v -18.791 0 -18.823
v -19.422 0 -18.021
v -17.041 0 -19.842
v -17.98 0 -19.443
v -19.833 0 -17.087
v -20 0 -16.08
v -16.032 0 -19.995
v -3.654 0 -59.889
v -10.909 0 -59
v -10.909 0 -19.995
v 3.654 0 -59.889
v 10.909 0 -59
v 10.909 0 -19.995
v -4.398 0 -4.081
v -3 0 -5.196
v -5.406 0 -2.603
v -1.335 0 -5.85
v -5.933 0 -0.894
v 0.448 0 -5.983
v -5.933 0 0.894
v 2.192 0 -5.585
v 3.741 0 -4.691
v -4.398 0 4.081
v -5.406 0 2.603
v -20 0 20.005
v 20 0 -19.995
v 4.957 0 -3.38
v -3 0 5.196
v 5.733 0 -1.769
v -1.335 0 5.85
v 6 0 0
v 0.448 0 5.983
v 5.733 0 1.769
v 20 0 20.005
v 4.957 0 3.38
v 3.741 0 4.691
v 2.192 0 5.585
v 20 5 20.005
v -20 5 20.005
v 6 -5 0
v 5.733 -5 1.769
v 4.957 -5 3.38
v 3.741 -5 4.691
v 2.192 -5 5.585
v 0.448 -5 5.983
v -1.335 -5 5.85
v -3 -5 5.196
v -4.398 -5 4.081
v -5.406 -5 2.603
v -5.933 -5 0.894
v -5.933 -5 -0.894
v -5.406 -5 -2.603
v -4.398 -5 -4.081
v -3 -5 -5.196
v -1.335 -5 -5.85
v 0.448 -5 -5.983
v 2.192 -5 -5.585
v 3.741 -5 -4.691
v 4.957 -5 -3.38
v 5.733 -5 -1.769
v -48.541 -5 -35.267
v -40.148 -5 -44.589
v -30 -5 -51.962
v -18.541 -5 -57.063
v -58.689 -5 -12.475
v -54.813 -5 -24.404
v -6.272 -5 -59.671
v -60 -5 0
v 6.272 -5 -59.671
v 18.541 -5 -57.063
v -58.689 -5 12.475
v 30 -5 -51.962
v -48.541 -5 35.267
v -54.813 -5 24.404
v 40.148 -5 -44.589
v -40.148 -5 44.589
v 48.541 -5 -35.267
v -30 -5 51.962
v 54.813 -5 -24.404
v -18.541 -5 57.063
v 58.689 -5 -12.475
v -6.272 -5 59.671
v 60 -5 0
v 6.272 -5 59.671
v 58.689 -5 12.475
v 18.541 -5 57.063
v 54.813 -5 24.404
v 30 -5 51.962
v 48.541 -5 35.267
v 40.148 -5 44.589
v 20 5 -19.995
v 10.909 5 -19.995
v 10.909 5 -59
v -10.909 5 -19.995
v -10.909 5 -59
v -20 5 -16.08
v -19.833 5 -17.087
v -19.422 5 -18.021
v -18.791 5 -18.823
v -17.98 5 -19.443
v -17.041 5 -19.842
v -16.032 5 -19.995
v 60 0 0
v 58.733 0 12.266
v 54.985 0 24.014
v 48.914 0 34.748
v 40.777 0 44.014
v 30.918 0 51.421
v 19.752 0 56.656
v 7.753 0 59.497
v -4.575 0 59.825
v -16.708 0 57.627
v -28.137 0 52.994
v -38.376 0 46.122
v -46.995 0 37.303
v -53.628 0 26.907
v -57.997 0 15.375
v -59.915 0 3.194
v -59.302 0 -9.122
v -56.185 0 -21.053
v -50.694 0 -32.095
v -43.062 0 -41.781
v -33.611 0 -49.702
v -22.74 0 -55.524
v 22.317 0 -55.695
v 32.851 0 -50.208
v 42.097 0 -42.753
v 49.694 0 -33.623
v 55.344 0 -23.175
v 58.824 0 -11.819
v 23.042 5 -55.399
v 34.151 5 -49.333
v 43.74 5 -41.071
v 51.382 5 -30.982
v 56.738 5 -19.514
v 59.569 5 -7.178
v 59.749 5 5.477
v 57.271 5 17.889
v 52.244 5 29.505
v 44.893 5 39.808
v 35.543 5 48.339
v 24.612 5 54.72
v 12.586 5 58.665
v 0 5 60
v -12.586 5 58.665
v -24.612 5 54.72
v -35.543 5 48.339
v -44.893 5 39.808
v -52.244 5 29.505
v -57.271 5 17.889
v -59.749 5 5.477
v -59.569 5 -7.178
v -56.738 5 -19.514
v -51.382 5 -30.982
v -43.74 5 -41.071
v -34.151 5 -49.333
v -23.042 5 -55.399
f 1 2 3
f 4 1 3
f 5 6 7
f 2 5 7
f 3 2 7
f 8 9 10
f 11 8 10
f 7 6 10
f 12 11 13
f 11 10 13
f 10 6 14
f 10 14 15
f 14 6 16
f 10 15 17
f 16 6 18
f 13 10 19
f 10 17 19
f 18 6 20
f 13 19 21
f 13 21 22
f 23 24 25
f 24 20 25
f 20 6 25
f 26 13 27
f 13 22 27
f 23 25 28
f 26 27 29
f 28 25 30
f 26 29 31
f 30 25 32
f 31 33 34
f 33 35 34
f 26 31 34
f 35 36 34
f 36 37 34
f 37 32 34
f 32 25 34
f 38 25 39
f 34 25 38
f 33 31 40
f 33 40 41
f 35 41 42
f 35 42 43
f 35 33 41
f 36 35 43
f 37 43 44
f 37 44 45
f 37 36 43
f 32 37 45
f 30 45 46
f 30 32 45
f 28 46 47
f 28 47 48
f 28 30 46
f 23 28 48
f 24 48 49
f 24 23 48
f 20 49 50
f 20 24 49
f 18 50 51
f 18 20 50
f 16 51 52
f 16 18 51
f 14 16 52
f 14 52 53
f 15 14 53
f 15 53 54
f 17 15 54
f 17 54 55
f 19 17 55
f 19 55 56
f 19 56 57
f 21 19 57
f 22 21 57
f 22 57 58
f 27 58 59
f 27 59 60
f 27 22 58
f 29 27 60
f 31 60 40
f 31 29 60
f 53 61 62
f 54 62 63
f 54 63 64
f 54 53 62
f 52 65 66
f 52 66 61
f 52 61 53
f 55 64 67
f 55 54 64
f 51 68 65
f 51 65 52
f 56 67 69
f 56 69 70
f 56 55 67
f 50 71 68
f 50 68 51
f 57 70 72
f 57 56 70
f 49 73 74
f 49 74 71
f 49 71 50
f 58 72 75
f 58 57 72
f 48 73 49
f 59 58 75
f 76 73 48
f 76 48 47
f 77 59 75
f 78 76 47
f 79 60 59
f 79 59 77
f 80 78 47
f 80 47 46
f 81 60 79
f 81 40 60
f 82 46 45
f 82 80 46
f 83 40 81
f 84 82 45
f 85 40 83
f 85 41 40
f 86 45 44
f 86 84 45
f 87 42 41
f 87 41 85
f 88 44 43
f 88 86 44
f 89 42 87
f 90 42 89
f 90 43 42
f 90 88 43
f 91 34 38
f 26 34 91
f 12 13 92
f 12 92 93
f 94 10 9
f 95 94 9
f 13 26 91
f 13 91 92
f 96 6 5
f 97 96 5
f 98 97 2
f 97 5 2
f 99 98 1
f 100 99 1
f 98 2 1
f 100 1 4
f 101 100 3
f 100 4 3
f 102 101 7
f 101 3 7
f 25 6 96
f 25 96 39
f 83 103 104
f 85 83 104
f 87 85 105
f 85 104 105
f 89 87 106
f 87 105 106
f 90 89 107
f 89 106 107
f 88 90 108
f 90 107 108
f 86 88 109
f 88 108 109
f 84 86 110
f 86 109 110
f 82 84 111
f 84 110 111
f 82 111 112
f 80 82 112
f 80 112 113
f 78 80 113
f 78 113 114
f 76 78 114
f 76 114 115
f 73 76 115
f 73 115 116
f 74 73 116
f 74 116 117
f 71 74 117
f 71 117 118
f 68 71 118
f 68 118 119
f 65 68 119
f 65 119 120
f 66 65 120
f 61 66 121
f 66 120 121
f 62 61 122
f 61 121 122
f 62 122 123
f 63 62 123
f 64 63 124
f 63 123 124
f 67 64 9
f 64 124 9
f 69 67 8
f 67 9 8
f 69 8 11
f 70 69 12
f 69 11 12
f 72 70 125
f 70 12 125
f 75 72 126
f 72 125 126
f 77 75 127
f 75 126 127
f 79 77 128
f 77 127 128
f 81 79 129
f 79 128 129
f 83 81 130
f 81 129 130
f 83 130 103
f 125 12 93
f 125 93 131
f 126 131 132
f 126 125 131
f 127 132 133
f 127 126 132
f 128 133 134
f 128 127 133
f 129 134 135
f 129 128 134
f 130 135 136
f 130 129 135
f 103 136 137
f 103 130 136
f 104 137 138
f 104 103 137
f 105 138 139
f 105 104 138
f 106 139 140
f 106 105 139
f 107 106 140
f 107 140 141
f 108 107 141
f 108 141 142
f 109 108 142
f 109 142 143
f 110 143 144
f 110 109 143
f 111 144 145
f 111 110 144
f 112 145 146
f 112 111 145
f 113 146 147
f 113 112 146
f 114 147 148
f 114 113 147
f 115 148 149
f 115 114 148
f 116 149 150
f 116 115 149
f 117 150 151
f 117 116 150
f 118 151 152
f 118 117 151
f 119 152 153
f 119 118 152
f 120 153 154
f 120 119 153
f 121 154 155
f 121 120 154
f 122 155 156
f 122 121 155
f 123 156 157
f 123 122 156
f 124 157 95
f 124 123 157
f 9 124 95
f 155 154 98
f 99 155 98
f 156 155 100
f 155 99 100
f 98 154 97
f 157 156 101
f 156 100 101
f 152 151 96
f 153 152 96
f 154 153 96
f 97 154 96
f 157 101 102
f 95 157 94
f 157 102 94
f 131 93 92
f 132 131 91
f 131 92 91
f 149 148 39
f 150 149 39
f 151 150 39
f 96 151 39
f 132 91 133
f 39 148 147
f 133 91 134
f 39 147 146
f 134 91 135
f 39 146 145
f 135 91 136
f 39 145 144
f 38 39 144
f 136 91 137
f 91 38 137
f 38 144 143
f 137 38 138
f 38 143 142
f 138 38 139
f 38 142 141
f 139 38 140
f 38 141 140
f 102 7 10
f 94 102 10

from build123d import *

# Parameters (mm, degrees)
SKETCH_R     = 60
SKETCH_R_2   = 6
PAD_DEPTH    = 5
PAD001_DEPTH = 5


with BuildPart() as part:
    # Sketch → Pad (new body)
    with BuildSketch(Plane.XZ):
        Circle(SKETCH_R)
        Circle(SKETCH_R_2, mode=Mode.SUBTRACT)
    extrude(amount=PAD_DEPTH)

    # Sketch001 → Pad001 (new body)
    with BuildSketch(Plane.XZ):
        with BuildLine():
            ThreePointArc((10.908712, -59), (0, 60), (-10.908712, -59))
            Line((-10.908712, -19.994713), (-10.908712, -59))
            Line((-16.031858, -19.994713), (-10.908712, -19.994713))
            ThreePointArc((-20, -16.079947), (-18.790704, -18.822669), (-16.031858, -19.994713))
            Line((-20, -16.079947), (-20, 20.005287))
            Line((-20, 20.005287), (20, 20.005287))
            Line((20, 20.005287), (20, -19.994713))
            Line((20, -19.994713), (10.908712, -19.994713))
            Line((10.908712, -19.994713), (10.908712, -59))
        make_face()
    extrude(amount=-PAD001_DEPTH)


solid = part.part
